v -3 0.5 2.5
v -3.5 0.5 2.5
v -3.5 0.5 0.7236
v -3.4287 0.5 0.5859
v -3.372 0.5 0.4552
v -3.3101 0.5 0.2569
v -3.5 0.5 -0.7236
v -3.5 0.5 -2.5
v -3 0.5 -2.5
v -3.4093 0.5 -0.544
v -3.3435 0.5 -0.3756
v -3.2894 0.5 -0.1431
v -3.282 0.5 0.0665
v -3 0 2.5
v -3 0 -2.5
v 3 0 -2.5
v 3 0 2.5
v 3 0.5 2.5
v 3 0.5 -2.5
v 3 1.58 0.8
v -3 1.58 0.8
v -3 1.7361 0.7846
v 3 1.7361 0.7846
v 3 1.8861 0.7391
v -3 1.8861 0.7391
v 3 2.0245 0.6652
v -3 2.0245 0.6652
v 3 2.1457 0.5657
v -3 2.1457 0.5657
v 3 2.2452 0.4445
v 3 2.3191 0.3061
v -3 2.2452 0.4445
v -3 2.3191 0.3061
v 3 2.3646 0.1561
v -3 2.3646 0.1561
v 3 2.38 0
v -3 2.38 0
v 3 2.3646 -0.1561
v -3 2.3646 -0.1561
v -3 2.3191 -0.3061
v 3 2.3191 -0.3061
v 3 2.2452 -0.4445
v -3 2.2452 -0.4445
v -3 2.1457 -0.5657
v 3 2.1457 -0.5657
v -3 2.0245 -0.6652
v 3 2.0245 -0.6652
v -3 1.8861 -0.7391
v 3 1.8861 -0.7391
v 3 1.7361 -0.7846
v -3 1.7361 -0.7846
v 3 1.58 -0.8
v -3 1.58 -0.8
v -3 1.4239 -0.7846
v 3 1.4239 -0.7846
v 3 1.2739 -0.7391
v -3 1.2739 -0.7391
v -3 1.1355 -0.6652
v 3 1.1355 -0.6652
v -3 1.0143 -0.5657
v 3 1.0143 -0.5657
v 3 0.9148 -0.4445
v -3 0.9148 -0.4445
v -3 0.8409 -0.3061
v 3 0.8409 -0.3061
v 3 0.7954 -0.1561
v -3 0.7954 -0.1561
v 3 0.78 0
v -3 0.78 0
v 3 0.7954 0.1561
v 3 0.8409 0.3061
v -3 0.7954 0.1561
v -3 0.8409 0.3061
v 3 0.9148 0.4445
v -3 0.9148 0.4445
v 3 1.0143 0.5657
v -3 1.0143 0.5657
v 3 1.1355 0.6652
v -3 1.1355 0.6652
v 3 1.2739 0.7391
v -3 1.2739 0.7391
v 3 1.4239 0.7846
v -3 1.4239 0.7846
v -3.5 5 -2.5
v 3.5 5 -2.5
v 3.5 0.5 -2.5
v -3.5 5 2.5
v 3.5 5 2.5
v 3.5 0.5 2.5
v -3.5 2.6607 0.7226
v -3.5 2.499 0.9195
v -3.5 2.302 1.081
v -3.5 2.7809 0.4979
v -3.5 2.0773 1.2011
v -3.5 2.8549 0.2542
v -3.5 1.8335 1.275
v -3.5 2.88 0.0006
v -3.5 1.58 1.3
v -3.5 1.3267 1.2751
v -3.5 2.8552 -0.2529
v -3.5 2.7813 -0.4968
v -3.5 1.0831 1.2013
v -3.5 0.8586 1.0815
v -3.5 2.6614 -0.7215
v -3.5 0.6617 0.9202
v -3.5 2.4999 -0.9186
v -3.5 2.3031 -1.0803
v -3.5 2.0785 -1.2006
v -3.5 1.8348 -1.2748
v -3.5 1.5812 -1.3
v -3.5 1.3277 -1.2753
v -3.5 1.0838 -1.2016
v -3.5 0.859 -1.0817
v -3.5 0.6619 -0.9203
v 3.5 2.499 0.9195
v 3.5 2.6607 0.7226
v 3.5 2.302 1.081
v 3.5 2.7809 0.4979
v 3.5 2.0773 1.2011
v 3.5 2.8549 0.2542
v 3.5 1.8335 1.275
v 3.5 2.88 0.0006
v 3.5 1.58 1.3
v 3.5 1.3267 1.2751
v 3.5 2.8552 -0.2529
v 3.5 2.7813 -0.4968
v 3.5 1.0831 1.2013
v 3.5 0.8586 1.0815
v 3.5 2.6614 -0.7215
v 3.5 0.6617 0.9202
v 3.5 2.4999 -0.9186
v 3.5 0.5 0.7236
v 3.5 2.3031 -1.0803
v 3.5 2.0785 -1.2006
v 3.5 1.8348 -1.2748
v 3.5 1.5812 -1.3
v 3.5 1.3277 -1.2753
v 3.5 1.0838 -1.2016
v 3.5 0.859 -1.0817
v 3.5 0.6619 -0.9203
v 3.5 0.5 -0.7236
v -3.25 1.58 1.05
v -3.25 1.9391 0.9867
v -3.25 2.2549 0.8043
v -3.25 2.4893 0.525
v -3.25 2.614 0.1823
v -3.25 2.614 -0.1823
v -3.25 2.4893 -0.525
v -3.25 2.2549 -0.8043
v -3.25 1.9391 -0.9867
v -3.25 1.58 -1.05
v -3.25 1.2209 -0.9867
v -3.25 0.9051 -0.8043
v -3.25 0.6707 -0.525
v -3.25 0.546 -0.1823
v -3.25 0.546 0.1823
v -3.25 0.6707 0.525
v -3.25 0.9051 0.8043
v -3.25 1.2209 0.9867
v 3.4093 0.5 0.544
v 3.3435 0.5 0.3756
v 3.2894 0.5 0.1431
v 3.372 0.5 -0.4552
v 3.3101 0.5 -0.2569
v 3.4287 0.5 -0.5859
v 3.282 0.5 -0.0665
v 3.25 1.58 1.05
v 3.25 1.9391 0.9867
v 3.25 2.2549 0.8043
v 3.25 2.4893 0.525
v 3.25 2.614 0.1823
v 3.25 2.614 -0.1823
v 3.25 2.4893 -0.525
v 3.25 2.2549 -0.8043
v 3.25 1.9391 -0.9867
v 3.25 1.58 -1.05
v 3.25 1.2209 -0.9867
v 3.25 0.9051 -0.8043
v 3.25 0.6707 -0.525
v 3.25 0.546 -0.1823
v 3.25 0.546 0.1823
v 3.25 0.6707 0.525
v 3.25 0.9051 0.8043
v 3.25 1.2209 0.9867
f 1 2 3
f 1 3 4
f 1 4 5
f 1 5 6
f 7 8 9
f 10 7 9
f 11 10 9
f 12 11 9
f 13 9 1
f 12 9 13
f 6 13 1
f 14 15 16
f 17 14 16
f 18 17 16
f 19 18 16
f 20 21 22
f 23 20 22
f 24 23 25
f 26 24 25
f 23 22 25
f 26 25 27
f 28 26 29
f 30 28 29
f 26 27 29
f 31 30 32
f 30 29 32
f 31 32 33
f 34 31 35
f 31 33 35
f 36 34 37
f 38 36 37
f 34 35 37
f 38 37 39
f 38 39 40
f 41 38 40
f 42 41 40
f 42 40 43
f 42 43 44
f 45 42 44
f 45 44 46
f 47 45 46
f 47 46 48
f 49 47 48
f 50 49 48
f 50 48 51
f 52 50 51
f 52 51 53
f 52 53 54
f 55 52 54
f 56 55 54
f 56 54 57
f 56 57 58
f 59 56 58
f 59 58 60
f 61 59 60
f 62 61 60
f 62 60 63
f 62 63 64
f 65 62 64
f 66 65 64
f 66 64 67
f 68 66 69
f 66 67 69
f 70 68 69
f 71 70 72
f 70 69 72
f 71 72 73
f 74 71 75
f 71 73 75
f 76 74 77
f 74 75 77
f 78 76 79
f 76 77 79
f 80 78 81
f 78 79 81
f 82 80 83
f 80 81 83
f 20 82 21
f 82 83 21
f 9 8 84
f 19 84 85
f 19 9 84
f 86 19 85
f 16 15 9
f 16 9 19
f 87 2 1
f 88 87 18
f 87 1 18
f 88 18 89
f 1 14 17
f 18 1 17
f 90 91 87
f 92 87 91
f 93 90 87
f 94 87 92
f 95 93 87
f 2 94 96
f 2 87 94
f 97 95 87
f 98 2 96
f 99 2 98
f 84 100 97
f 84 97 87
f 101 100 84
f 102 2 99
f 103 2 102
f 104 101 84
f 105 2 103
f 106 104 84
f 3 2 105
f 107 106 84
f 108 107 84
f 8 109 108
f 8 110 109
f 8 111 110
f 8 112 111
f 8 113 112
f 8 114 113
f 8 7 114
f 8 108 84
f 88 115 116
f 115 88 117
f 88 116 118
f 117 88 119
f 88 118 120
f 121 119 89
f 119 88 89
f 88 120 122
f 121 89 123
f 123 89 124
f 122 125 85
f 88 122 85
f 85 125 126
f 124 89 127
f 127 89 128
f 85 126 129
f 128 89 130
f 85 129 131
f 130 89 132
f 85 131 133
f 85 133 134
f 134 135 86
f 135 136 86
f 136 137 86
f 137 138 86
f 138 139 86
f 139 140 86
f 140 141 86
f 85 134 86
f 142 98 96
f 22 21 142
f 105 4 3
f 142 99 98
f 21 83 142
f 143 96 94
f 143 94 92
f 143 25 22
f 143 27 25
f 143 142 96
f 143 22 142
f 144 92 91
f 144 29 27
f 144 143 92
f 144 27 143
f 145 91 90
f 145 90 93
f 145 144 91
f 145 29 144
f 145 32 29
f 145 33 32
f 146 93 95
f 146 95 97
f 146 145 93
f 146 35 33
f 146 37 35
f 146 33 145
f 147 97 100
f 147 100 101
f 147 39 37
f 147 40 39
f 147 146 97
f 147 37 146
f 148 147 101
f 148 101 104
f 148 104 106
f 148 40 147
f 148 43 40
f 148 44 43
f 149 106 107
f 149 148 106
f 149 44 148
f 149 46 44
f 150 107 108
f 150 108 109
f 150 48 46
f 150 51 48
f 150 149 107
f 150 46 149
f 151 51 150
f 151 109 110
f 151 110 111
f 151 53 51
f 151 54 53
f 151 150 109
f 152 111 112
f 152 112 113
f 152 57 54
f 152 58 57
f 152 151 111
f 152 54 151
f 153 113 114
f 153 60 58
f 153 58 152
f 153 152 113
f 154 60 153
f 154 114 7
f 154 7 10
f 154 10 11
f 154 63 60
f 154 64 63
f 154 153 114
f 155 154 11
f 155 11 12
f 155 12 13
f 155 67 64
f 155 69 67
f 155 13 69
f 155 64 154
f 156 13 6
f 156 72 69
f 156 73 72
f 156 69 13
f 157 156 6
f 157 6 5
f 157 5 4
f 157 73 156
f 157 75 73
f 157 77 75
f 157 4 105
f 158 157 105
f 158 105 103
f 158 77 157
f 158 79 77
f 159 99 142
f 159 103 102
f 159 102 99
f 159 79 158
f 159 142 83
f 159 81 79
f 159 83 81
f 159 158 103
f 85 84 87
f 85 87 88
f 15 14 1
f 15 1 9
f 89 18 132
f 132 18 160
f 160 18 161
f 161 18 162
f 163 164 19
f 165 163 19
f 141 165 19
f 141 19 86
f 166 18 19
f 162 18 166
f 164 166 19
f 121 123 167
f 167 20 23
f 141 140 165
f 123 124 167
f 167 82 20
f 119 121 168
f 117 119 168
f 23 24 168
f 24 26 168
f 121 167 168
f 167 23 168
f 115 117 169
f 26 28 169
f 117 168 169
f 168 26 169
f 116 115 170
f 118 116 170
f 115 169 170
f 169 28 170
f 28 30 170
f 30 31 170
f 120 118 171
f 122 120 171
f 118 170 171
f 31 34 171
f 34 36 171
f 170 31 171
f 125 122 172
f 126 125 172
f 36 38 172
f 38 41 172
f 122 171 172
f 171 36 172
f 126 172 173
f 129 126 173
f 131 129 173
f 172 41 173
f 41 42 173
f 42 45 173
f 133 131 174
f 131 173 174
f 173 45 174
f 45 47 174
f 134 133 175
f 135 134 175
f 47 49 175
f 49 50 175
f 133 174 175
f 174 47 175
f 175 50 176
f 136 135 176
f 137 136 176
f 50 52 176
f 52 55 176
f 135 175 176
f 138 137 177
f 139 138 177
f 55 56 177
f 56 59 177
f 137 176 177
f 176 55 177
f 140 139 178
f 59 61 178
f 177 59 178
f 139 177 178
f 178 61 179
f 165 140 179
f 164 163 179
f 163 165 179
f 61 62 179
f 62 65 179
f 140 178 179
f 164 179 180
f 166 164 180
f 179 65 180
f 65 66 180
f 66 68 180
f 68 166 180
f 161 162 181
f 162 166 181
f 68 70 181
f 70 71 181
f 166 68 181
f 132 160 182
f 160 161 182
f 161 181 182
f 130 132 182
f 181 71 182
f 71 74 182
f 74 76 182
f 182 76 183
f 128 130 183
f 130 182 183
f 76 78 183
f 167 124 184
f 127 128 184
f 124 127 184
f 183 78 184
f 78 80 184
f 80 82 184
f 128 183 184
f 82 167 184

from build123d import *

# Parameters (mm, degrees)
SKETCH1_W           = 6
SKETCH1_H           = 5
BOSS_EXTRUDE1_DEPTH = 0.5
SKETCH2_W           = 7
SKETCH2_H           = 5
BOSS_EXTRUDE2_DEPTH = 4.5
SKETCH3_R           = 0.8
CUT_EXTRUDE1_DEPTH  = 9.958236434
CHAMFER1_SIZE       = 0.5


with BuildPart() as part:
    # Sketch1 → Boss-Extrude1 (new body)
    with BuildSketch(Plane(origin=(0, 0, 0), x_dir=(1, 0, 0), z_dir=(0, 1, 0))):
        Rectangle(SKETCH1_W, SKETCH1_H)
    extrude(amount=BOSS_EXTRUDE1_DEPTH)

    # Sketch2 → Boss-Extrude2 (add)
    with BuildSketch(Plane(origin=(0, 0.5, 0), x_dir=(1, 0, 0), z_dir=(0, 1, 0))):
        Rectangle(SKETCH2_W, SKETCH2_H)
    extrude(amount=BOSS_EXTRUDE2_DEPTH)

    # Sketch3 → Cut-Extrude1 (cut, through all)
    with BuildSketch(Plane.ZY.offset(3.5)):
        with Locations((0, 1.58)):
            Circle(SKETCH3_R)
    extrude(amount=-CUT_EXTRUDE1_DEPTH, mode=Mode.SUBTRACT)

    # Chamfer1
    # the kernel refuses this chamfer: 0.5 mm, written as the material it takes off along each edge
    with BuildSketch(Plane(origin=(3.5, 1.58, 0), x_dir=(0, 0, 1), z_dir=(0, -1, 0))) as chamfer1_piece_1:
        Polygon((0.8 + CHAMFER1_SIZE, 0), (0.8, CHAMFER1_SIZE), (0.8, 0), align=None)
    revolve(axis=Axis((3.5, 1.58, 0), (-1, 0, 0)), mode=Mode.SUBTRACT)
    with BuildSketch(Plane(origin=(-3.5, 1.58, 0), x_dir=(0, 0, 1), z_dir=(0, -1, 0))) as chamfer1_piece_2:
        Polygon((0.8 + CHAMFER1_SIZE, 0), (0.8, -CHAMFER1_SIZE), (0.8, 0), align=None)
    revolve(axis=Axis((-3.5, 1.58, 0), (-1, 0, 0)), mode=Mode.SUBTRACT)


solid = part.part
